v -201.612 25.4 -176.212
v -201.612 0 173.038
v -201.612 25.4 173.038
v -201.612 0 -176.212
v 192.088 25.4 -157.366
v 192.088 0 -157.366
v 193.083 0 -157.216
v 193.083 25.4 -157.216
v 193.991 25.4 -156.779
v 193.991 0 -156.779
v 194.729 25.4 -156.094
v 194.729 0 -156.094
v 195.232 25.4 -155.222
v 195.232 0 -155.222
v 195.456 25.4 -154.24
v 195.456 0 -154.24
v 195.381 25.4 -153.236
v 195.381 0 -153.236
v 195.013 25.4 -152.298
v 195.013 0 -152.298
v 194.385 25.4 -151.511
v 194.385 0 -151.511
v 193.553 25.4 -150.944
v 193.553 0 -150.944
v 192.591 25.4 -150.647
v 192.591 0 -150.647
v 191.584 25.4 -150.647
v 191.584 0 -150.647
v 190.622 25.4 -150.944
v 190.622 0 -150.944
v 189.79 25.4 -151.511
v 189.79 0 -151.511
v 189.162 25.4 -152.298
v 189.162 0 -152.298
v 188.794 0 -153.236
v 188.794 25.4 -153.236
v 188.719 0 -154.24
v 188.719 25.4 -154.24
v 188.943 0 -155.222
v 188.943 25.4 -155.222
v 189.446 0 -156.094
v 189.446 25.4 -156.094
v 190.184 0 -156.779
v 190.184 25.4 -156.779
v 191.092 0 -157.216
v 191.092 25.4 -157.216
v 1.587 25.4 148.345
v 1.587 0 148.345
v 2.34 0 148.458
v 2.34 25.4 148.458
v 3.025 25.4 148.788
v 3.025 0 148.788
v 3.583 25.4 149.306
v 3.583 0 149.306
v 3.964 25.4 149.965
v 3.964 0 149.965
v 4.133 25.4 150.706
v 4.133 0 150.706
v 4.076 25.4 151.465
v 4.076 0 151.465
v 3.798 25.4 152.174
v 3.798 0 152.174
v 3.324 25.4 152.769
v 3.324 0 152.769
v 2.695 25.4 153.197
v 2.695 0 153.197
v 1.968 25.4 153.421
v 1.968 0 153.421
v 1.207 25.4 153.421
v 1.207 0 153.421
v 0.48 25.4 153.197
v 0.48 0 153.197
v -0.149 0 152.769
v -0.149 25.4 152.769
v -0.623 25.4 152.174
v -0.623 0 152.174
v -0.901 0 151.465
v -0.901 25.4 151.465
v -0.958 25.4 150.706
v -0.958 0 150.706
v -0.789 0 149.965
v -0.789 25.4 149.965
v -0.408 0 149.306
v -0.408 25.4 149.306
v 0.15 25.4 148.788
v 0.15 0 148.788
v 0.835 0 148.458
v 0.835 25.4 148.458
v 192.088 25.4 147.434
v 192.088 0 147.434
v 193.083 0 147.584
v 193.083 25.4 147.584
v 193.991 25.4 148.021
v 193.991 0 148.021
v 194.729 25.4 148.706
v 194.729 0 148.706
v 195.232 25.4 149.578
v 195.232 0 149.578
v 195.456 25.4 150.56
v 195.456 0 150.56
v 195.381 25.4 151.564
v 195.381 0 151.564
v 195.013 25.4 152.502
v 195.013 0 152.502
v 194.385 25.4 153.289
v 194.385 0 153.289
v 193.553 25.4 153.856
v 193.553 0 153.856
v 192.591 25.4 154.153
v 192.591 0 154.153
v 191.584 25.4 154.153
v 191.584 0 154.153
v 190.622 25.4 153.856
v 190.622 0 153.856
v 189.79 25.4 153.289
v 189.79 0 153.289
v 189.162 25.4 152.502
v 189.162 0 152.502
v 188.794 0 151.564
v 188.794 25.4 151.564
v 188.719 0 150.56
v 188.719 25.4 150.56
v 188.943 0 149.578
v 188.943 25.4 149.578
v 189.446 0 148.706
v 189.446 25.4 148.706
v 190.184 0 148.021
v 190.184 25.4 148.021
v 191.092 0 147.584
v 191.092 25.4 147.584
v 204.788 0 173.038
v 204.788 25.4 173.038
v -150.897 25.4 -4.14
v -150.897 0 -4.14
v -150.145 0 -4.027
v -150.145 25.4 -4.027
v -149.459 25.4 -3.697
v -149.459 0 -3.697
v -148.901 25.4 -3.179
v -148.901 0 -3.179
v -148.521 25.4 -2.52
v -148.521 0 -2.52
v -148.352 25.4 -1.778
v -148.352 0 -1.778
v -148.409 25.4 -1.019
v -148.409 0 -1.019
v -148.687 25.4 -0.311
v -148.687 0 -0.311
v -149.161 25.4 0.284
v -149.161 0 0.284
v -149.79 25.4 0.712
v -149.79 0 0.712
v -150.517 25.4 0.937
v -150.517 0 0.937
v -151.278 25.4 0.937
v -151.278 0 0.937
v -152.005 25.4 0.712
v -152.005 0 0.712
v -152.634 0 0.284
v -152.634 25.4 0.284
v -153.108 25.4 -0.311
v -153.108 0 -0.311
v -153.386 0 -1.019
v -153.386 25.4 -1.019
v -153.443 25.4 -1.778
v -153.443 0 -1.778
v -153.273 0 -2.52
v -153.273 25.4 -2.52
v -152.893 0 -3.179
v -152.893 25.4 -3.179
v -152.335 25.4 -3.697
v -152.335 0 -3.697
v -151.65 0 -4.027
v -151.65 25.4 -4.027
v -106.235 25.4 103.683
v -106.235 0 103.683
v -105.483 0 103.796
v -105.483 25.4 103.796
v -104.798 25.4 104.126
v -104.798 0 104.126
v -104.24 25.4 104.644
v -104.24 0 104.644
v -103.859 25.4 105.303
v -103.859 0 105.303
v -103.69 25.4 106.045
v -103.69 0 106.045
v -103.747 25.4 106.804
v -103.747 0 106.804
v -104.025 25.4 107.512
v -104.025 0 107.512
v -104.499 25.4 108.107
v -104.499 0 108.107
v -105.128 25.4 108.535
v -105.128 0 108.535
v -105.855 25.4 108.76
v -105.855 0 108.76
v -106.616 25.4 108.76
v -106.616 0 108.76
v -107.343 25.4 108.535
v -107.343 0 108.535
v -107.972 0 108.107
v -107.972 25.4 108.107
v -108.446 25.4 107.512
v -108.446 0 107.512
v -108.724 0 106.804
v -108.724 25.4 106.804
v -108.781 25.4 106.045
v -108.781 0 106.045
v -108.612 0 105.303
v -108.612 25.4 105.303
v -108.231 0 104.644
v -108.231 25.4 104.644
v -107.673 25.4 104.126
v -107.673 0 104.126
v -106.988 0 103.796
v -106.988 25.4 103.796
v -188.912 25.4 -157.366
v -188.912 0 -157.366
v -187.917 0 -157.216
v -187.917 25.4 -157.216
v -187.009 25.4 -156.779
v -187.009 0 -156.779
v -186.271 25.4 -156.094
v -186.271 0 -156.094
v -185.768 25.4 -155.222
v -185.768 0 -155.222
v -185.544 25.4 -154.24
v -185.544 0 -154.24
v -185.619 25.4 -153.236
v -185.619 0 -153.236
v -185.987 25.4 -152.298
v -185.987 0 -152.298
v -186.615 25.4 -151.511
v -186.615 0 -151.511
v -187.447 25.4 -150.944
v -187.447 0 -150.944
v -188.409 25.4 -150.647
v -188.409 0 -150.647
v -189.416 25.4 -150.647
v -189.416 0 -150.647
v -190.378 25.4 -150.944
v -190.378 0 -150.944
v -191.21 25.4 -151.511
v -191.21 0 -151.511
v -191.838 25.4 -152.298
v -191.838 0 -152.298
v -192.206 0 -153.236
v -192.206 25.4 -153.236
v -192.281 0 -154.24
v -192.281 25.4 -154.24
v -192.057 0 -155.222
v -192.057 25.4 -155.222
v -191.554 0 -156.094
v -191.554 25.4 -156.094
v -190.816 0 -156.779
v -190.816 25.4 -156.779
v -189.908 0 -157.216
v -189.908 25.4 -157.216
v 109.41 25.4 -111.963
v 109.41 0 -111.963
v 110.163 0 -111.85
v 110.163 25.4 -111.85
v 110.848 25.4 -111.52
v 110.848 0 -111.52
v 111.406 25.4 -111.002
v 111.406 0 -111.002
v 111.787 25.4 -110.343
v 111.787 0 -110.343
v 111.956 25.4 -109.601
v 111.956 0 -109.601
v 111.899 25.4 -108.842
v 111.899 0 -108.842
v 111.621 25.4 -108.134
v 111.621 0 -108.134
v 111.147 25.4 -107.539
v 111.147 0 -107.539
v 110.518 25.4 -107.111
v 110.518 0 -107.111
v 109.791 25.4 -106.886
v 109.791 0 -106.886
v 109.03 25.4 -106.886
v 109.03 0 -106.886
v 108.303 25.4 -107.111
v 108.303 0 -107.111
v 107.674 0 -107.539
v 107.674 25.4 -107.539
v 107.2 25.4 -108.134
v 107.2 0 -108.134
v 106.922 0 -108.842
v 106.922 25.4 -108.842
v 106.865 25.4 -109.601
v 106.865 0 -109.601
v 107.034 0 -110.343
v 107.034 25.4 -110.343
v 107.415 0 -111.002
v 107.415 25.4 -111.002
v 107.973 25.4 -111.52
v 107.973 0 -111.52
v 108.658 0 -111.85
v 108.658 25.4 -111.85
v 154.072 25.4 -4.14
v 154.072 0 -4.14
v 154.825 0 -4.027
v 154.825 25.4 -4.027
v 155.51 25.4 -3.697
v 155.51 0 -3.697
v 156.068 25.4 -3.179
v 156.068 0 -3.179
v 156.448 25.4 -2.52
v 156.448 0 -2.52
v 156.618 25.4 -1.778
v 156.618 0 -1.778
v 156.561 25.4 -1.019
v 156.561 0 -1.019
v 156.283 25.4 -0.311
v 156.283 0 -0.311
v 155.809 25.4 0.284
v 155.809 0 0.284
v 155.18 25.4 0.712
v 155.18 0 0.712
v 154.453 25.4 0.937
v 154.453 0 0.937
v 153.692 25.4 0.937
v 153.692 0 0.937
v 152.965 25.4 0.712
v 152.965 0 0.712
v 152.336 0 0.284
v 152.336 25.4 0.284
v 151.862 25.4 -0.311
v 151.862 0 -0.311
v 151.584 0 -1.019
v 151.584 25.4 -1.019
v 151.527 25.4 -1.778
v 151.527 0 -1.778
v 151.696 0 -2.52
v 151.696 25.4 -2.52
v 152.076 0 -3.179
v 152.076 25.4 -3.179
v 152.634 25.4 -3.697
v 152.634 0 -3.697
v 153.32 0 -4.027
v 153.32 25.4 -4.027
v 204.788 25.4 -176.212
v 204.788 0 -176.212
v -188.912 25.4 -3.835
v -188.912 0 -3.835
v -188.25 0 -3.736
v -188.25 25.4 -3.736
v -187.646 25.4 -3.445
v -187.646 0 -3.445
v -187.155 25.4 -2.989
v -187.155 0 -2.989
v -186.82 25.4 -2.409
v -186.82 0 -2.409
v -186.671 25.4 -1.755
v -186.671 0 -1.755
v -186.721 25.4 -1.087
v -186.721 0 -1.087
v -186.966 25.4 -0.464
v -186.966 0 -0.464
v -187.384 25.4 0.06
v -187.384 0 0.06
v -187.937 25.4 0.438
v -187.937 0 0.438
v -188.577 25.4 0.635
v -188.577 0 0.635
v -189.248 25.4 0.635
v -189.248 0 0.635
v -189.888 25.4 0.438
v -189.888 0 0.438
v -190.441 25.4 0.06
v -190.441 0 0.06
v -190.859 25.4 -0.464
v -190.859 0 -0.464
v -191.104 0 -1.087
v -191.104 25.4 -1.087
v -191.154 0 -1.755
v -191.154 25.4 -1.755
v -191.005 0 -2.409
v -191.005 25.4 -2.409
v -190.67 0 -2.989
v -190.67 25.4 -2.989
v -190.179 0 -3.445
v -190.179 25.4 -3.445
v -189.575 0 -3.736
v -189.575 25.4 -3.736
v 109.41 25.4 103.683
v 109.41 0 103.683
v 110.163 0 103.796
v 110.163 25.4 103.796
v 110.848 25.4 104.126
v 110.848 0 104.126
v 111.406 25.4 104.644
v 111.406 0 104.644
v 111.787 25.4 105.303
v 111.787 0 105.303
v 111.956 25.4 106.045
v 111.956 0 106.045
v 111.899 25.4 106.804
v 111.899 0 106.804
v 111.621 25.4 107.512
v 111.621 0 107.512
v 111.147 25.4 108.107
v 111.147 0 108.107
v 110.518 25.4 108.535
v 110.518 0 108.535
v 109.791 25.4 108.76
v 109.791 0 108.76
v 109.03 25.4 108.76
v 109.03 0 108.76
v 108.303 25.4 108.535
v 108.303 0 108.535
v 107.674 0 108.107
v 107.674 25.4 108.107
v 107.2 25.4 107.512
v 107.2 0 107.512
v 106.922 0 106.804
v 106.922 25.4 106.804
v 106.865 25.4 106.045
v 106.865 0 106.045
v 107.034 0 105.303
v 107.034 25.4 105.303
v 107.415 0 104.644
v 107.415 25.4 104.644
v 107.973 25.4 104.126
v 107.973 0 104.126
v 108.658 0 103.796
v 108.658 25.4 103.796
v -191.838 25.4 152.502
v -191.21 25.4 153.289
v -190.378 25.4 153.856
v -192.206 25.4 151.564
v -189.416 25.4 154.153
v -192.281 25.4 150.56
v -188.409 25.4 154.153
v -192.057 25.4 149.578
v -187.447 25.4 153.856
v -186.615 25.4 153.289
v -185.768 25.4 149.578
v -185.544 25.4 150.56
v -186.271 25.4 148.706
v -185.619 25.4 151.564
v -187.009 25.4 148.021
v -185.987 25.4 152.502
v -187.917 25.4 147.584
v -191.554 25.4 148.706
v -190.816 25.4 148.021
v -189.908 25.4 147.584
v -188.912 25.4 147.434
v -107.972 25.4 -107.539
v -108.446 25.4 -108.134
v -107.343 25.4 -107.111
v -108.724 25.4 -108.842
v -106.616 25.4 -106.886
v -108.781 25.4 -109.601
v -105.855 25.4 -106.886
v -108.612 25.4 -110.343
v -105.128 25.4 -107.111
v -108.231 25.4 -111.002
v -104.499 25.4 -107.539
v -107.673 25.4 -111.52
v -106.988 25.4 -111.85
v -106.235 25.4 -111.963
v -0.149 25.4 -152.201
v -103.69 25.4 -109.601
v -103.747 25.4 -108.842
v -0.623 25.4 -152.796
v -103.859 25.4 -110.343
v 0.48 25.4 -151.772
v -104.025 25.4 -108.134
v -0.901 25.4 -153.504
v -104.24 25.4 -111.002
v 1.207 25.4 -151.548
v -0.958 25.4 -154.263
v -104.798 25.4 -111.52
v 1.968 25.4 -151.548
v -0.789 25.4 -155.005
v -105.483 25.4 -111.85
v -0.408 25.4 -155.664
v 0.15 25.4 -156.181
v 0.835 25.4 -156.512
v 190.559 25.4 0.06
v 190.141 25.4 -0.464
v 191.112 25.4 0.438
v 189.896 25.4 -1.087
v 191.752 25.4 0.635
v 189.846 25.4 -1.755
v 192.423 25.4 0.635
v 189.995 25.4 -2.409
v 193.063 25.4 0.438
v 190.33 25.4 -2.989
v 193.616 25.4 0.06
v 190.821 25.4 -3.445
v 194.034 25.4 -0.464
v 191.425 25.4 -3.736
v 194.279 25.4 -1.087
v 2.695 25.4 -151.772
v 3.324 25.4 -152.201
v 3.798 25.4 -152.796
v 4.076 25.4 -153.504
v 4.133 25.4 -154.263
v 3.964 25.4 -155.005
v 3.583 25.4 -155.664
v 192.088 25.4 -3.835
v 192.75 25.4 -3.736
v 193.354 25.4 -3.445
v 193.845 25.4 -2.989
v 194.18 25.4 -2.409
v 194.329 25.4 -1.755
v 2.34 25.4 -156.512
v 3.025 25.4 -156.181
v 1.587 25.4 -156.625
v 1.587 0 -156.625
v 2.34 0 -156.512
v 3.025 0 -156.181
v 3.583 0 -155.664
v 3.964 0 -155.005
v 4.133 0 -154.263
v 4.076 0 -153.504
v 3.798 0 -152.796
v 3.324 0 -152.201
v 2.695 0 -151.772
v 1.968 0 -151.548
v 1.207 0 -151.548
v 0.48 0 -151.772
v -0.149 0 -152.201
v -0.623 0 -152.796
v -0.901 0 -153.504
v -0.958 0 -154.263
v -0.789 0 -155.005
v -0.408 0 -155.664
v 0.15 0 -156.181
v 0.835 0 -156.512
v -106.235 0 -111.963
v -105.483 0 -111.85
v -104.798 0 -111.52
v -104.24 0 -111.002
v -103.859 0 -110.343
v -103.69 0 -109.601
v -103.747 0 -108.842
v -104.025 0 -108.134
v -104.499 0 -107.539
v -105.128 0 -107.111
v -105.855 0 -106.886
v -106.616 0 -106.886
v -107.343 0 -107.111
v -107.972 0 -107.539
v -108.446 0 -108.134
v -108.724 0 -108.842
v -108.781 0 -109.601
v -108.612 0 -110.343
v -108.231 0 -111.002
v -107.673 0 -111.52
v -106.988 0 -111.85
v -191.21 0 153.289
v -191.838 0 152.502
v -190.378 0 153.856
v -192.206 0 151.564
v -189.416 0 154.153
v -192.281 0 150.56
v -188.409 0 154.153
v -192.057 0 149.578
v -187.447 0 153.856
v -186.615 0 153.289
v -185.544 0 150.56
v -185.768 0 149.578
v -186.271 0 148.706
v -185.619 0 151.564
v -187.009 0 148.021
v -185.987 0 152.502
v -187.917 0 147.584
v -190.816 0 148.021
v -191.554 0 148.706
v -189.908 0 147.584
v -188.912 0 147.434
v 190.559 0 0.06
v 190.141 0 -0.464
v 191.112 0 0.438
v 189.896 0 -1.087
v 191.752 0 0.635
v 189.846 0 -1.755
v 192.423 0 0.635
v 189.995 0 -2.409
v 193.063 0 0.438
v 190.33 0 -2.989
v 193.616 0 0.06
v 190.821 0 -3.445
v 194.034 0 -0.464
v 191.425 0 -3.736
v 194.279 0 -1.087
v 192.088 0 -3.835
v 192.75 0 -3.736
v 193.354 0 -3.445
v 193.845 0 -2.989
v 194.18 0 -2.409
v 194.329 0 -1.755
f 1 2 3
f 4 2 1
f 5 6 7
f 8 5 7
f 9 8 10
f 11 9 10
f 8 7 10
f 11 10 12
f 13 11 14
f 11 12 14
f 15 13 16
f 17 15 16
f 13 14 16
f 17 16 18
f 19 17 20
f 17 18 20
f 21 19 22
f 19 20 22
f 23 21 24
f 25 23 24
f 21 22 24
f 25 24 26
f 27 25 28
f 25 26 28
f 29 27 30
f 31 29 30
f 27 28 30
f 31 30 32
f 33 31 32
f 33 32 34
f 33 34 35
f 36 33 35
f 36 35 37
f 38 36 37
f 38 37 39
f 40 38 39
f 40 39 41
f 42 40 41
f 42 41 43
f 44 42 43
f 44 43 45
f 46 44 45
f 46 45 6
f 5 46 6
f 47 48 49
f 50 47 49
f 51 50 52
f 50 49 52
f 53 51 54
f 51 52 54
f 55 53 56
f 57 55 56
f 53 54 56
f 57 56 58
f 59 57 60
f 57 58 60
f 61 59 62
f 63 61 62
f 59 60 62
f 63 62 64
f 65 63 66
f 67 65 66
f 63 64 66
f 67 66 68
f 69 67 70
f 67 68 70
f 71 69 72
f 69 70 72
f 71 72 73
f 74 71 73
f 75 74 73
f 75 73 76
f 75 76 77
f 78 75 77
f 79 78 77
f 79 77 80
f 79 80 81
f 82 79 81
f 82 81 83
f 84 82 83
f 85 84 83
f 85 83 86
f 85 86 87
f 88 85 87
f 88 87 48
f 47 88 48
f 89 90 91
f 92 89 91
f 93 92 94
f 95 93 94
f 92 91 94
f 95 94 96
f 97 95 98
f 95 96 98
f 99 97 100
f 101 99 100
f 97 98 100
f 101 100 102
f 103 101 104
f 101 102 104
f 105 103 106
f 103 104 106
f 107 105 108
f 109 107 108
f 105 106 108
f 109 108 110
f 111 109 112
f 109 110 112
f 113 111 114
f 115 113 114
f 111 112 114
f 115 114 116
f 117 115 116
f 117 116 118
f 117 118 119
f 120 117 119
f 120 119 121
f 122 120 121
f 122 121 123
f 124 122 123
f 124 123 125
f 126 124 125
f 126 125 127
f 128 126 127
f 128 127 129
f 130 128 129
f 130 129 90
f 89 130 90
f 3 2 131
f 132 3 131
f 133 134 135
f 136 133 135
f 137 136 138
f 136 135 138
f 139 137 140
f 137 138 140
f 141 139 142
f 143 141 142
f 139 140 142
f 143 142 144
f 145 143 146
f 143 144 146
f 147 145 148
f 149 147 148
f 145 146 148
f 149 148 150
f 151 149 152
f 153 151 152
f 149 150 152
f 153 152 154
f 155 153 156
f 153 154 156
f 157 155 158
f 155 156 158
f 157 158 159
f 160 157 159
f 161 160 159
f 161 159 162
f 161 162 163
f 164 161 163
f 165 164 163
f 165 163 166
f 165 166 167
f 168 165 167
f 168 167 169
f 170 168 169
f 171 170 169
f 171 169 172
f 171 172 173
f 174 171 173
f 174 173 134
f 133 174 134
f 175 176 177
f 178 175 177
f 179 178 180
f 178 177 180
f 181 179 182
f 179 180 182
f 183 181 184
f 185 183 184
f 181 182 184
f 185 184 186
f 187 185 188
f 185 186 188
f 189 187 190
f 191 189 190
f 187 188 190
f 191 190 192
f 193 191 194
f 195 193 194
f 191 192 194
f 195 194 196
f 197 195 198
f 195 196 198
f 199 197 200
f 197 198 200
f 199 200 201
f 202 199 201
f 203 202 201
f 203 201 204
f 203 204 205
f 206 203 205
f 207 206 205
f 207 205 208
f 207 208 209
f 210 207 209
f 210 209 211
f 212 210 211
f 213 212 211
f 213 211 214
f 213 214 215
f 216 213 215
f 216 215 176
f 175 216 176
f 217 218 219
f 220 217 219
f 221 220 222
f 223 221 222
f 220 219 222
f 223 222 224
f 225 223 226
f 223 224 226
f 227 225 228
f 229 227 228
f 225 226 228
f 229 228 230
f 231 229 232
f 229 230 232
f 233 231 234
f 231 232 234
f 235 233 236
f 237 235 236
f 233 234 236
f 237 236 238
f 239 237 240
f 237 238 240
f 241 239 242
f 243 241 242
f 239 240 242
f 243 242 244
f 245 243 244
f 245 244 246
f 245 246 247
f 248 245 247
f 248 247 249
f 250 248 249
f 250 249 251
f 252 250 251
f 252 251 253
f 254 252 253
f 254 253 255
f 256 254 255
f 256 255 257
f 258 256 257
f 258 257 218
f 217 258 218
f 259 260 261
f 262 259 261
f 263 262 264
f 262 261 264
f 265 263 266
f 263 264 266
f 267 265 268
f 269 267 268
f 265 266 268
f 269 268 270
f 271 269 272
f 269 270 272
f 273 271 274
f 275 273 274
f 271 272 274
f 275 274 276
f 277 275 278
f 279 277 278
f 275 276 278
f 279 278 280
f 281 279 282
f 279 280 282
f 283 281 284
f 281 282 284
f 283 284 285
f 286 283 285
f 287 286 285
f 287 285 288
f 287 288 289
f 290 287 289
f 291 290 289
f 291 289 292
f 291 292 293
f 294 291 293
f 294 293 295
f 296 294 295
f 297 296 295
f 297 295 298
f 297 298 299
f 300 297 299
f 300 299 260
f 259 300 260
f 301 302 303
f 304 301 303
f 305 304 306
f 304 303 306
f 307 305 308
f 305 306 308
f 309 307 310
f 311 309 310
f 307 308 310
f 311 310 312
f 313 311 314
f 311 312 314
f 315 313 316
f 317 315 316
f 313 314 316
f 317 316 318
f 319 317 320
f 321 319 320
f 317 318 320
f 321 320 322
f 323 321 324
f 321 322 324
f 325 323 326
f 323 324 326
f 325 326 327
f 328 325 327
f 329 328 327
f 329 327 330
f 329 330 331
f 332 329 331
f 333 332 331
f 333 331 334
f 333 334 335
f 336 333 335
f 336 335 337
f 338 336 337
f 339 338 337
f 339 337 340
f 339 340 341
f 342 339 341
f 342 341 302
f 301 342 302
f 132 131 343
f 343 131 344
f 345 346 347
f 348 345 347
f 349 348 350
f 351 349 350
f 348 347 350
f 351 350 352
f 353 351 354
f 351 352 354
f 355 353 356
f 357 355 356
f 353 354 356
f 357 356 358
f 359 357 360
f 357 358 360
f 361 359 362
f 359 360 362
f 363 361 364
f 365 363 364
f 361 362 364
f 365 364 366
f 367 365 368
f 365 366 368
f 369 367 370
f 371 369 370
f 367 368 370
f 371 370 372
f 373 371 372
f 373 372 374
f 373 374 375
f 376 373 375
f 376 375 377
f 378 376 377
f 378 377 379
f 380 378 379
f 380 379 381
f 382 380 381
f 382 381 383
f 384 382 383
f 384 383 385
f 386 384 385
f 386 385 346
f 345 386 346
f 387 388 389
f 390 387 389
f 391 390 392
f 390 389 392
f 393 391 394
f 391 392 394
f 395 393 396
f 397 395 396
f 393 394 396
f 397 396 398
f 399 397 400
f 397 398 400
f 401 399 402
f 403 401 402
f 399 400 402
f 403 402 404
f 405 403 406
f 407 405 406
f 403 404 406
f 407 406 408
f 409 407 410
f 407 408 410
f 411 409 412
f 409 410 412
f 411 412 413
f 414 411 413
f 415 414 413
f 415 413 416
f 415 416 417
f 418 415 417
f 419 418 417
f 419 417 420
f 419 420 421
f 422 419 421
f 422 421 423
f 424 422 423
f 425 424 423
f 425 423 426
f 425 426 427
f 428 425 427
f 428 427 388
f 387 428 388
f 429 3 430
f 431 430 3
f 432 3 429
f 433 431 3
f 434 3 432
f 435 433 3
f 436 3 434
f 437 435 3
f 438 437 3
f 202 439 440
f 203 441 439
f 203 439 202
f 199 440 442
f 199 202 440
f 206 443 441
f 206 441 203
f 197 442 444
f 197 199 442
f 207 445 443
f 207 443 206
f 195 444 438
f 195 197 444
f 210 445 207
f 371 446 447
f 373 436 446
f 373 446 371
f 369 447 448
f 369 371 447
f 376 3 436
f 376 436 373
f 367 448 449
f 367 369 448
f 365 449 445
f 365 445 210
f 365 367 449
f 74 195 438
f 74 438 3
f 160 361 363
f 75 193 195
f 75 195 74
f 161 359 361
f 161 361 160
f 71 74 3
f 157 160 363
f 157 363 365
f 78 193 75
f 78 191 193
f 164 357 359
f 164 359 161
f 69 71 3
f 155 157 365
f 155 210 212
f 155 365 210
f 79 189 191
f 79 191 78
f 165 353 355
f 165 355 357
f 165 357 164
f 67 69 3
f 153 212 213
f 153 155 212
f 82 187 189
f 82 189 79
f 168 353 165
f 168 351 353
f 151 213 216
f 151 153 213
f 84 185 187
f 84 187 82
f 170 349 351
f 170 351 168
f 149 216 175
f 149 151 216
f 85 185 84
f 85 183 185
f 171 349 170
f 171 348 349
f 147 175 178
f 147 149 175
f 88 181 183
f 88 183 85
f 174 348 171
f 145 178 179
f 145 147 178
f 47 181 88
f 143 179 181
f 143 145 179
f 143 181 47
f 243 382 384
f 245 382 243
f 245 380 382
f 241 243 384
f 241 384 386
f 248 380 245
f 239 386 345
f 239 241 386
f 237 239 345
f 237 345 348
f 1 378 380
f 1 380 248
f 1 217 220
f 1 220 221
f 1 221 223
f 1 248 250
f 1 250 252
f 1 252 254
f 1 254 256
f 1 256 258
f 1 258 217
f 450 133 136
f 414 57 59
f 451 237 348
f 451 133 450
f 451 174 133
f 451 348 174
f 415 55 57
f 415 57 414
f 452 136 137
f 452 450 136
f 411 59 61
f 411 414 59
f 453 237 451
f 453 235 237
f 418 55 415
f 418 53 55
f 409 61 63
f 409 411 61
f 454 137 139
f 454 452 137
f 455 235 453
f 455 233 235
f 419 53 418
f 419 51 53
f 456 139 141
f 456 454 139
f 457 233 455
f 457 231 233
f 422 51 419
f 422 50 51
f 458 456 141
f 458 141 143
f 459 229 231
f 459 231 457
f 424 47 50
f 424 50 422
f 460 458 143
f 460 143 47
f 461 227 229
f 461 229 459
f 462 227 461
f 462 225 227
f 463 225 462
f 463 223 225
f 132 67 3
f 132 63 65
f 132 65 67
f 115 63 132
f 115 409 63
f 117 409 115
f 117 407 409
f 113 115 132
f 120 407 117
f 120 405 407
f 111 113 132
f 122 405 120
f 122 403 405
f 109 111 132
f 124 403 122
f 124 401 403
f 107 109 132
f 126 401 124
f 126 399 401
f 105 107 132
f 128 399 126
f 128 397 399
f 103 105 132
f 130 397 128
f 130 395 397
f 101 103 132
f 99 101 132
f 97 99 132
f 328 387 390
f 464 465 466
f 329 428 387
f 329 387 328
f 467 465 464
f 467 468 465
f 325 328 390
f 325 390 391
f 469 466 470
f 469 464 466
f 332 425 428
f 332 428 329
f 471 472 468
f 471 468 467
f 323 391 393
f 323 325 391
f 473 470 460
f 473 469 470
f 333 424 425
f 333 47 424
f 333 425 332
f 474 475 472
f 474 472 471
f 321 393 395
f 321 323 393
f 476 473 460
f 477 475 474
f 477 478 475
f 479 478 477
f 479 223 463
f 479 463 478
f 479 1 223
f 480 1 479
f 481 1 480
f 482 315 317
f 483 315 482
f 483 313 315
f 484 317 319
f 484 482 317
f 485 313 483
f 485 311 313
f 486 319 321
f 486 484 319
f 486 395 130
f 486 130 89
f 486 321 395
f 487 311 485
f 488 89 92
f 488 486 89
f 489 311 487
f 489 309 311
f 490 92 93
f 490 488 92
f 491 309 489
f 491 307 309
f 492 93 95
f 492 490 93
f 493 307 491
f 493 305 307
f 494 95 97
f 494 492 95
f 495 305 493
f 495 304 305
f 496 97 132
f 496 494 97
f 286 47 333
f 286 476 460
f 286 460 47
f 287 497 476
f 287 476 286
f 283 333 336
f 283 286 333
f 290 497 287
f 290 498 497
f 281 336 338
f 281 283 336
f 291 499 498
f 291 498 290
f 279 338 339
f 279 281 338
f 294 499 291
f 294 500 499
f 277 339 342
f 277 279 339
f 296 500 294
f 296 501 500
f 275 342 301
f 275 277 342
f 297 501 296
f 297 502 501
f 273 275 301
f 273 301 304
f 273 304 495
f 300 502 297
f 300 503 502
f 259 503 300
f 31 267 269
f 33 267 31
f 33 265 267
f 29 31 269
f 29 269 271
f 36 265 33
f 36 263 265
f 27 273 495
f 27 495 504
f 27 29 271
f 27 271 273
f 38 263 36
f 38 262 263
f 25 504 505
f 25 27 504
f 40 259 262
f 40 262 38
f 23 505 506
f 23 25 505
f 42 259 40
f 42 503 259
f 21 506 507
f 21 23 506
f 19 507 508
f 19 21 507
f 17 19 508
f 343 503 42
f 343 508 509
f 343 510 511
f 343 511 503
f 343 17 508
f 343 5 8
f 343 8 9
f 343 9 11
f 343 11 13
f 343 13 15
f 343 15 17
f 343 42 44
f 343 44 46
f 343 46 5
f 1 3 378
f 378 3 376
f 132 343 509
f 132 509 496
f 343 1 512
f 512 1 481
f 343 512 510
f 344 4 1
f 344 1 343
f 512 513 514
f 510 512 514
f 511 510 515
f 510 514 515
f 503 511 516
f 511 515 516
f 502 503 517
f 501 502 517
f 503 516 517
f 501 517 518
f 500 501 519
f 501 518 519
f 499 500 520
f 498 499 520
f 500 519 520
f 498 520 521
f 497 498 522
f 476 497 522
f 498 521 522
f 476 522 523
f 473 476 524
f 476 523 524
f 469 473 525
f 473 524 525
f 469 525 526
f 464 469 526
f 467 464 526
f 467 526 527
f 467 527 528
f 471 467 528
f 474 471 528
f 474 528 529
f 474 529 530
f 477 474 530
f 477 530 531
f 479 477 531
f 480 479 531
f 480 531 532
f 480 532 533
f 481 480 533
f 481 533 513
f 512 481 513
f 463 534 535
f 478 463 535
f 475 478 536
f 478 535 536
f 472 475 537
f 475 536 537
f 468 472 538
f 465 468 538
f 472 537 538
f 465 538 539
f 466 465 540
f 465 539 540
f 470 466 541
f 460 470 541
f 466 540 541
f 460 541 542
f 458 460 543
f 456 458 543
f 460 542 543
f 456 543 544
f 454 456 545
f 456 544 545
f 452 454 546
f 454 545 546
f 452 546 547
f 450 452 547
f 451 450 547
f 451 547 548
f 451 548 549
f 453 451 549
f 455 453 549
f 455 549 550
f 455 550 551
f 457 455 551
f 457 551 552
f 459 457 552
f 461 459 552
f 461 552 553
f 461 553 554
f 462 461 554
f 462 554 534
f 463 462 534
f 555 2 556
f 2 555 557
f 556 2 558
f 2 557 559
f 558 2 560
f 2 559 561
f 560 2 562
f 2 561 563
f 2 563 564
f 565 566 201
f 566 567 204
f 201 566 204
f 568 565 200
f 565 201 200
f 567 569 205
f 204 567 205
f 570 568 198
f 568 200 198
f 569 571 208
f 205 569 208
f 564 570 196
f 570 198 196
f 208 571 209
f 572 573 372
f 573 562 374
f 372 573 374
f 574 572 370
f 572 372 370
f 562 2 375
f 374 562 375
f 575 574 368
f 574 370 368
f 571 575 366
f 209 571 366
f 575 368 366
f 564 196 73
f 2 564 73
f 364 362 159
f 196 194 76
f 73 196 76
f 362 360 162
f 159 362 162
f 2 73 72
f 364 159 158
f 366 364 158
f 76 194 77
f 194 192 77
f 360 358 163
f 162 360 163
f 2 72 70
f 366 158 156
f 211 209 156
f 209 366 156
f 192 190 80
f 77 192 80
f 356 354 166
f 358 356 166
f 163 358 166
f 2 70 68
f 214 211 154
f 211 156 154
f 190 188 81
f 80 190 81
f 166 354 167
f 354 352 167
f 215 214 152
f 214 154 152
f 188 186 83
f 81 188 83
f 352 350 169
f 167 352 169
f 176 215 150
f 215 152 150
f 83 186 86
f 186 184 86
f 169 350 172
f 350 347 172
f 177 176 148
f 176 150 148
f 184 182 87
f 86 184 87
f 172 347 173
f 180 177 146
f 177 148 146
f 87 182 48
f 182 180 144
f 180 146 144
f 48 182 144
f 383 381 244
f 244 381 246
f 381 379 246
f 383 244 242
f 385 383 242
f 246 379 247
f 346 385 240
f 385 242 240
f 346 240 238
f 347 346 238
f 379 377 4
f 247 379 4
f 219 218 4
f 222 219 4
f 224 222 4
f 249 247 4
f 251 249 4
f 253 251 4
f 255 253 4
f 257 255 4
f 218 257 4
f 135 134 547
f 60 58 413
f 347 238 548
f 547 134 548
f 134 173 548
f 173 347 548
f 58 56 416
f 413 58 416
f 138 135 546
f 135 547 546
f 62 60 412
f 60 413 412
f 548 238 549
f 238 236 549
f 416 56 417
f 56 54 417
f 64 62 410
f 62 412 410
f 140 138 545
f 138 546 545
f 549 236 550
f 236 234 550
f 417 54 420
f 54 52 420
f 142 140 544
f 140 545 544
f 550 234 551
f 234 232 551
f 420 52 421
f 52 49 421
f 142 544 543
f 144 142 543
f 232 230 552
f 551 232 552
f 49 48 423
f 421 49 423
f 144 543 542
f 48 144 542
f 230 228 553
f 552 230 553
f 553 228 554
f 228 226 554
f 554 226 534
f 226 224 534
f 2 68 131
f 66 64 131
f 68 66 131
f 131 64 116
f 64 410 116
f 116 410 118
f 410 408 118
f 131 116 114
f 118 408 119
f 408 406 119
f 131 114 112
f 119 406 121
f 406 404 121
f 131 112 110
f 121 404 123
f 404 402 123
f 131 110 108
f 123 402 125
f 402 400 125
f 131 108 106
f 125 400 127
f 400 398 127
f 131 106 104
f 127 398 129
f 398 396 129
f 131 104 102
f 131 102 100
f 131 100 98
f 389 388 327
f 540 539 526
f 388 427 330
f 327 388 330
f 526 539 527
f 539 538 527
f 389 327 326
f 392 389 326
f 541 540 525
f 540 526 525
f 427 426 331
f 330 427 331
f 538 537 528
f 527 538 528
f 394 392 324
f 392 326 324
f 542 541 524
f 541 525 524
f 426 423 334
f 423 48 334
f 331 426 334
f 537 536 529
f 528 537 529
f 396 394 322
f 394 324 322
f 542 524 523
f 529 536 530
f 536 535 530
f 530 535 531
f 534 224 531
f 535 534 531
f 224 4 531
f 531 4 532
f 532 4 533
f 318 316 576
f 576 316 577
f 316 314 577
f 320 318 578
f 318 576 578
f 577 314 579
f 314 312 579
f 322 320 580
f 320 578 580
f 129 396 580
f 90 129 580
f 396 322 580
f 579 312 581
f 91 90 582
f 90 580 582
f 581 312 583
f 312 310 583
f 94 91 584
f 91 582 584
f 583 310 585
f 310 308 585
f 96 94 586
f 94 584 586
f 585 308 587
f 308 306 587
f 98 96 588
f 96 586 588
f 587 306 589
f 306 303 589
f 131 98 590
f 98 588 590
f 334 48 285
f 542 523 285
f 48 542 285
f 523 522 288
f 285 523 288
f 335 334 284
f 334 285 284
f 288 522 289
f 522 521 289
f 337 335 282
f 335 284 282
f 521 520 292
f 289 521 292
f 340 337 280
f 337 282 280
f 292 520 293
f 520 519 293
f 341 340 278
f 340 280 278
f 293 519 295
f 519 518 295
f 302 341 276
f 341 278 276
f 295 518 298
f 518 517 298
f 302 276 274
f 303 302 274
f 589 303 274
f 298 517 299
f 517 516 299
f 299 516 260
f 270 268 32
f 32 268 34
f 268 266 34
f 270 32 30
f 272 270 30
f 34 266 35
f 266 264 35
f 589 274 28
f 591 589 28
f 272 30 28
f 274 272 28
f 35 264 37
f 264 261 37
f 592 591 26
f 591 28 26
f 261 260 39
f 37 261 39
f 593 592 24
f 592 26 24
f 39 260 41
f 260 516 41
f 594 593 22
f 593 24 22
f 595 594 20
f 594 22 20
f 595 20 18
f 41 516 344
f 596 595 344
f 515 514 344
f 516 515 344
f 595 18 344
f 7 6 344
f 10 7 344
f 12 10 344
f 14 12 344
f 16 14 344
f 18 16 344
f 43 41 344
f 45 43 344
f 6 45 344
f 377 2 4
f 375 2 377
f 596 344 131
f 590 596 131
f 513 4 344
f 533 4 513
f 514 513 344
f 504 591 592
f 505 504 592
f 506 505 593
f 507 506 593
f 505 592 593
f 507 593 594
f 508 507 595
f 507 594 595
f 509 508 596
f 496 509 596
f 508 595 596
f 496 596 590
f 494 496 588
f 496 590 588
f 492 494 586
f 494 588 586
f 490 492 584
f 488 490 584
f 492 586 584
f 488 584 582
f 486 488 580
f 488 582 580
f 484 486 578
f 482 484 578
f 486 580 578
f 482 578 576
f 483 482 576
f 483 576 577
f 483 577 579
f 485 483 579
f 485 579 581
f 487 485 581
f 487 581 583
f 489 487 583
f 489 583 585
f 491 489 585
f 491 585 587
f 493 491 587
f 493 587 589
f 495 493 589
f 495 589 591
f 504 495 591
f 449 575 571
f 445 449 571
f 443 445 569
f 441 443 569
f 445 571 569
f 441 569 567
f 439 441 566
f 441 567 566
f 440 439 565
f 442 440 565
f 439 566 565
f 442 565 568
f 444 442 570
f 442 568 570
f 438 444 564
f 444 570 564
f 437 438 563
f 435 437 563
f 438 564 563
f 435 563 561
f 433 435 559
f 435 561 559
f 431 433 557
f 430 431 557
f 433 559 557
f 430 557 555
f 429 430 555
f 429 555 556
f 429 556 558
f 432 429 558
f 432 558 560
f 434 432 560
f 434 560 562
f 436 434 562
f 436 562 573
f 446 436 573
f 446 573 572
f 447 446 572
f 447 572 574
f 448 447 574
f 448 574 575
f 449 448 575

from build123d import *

# Parameters (mm, degrees)
SKETCH1_W                   = 406.4
SKETCH1_H                   = 349.25
BOSS_EXTRUDE1_DEPTH         = 25.4
F_1_4_CLEARANCE_HOLE1_D     = 6.7564
F_1_4_CLEARANCE_HOLE1_DEPTH = 70
F_1_4_CLEARANCE_HOLE1_TIP   = 2.029827343
F_8_CLEARANCE_HOLE1_D       = 4.4958
F_8_CLEARANCE_HOLE1_DEPTH   = 70
F_8_CLEARANCE_HOLE1_TIP     = 1.350674586
F_1_4_20_TAPPED_HOLE1_D     = 5.1054
F_1_4_20_TAPPED_HOLE1_DEPTH = 39.05
F_1_4_20_TAPPED_HOLE1_TIP   = 1.533816902


with BuildPart() as part:
    # Sketch1 → Boss-Extrude1 (new body)
    with BuildSketch(Plane(origin=(0, 0, 0), x_dir=(1, 0, 0), z_dir=(0, 1, 0))):
        with Locations((1.5875, 1.5875)):
            Rectangle(SKETCH1_W, SKETCH1_H)
    extrude(amount=BOSS_EXTRUDE1_DEPTH)

    # 1/4 Clearance Hole1
    with Locations(Plane(origin=(-188.9125, 25.4, -153.9875), x_dir=(0, 0, 1), z_dir=(0, 1, 0))):
        with Locations((0, 0), (0, 381), (304.8, 381), (304.8, 0)):
            Hole(F_1_4_CLEARANCE_HOLE1_D / 2, depth=F_1_4_CLEARANCE_HOLE1_DEPTH)
            with Locations((0, 0, -(F_1_4_CLEARANCE_HOLE1_DEPTH + F_1_4_CLEARANCE_HOLE1_TIP / 2))):  # 118° drill point
                Cone(0, F_1_4_CLEARANCE_HOLE1_D / 2, F_1_4_CLEARANCE_HOLE1_TIP, mode=Mode.SUBTRACT)

    # #8 Clearance Hole1
    with Locations(Plane(origin=(-188.9125, 25.4, -1.5875), x_dir=(0, 0, 1), z_dir=(0, 1, 0))):
        with Locations((0, 0), (0, 381)):
            Hole(F_8_CLEARANCE_HOLE1_D / 2, depth=F_8_CLEARANCE_HOLE1_DEPTH)
            with Locations((0, 0, -(F_8_CLEARANCE_HOLE1_DEPTH + F_8_CLEARANCE_HOLE1_TIP / 2))):  # 118° drill point
                Cone(0, F_8_CLEARANCE_HOLE1_D / 2, F_8_CLEARANCE_HOLE1_TIP, mode=Mode.SUBTRACT)

    # 1/4-20 Tapped Hole1
    with Locations(Plane(origin=(1.5875, 25.4, -154.072248936), x_dir=(0, 0, 1), z_dir=(0, 1, 0))):
        with Locations((0, 0), (44.661748936, -107.823), (44.661748936, 107.823), (152.484748936, 152.484748936), (152.484748936, -152.484748936), (260.307748936, -107.823), (304.969497872, 0), (260.307748936, 107.823)):
            Hole(F_1_4_20_TAPPED_HOLE1_D / 2, depth=F_1_4_20_TAPPED_HOLE1_DEPTH)
            with Locations((0, 0, -(F_1_4_20_TAPPED_HOLE1_DEPTH + F_1_4_20_TAPPED_HOLE1_TIP / 2))):  # 118° drill point
                Cone(0, F_1_4_20_TAPPED_HOLE1_D / 2, F_1_4_20_TAPPED_HOLE1_TIP, mode=Mode.SUBTRACT)


solid = part.part
